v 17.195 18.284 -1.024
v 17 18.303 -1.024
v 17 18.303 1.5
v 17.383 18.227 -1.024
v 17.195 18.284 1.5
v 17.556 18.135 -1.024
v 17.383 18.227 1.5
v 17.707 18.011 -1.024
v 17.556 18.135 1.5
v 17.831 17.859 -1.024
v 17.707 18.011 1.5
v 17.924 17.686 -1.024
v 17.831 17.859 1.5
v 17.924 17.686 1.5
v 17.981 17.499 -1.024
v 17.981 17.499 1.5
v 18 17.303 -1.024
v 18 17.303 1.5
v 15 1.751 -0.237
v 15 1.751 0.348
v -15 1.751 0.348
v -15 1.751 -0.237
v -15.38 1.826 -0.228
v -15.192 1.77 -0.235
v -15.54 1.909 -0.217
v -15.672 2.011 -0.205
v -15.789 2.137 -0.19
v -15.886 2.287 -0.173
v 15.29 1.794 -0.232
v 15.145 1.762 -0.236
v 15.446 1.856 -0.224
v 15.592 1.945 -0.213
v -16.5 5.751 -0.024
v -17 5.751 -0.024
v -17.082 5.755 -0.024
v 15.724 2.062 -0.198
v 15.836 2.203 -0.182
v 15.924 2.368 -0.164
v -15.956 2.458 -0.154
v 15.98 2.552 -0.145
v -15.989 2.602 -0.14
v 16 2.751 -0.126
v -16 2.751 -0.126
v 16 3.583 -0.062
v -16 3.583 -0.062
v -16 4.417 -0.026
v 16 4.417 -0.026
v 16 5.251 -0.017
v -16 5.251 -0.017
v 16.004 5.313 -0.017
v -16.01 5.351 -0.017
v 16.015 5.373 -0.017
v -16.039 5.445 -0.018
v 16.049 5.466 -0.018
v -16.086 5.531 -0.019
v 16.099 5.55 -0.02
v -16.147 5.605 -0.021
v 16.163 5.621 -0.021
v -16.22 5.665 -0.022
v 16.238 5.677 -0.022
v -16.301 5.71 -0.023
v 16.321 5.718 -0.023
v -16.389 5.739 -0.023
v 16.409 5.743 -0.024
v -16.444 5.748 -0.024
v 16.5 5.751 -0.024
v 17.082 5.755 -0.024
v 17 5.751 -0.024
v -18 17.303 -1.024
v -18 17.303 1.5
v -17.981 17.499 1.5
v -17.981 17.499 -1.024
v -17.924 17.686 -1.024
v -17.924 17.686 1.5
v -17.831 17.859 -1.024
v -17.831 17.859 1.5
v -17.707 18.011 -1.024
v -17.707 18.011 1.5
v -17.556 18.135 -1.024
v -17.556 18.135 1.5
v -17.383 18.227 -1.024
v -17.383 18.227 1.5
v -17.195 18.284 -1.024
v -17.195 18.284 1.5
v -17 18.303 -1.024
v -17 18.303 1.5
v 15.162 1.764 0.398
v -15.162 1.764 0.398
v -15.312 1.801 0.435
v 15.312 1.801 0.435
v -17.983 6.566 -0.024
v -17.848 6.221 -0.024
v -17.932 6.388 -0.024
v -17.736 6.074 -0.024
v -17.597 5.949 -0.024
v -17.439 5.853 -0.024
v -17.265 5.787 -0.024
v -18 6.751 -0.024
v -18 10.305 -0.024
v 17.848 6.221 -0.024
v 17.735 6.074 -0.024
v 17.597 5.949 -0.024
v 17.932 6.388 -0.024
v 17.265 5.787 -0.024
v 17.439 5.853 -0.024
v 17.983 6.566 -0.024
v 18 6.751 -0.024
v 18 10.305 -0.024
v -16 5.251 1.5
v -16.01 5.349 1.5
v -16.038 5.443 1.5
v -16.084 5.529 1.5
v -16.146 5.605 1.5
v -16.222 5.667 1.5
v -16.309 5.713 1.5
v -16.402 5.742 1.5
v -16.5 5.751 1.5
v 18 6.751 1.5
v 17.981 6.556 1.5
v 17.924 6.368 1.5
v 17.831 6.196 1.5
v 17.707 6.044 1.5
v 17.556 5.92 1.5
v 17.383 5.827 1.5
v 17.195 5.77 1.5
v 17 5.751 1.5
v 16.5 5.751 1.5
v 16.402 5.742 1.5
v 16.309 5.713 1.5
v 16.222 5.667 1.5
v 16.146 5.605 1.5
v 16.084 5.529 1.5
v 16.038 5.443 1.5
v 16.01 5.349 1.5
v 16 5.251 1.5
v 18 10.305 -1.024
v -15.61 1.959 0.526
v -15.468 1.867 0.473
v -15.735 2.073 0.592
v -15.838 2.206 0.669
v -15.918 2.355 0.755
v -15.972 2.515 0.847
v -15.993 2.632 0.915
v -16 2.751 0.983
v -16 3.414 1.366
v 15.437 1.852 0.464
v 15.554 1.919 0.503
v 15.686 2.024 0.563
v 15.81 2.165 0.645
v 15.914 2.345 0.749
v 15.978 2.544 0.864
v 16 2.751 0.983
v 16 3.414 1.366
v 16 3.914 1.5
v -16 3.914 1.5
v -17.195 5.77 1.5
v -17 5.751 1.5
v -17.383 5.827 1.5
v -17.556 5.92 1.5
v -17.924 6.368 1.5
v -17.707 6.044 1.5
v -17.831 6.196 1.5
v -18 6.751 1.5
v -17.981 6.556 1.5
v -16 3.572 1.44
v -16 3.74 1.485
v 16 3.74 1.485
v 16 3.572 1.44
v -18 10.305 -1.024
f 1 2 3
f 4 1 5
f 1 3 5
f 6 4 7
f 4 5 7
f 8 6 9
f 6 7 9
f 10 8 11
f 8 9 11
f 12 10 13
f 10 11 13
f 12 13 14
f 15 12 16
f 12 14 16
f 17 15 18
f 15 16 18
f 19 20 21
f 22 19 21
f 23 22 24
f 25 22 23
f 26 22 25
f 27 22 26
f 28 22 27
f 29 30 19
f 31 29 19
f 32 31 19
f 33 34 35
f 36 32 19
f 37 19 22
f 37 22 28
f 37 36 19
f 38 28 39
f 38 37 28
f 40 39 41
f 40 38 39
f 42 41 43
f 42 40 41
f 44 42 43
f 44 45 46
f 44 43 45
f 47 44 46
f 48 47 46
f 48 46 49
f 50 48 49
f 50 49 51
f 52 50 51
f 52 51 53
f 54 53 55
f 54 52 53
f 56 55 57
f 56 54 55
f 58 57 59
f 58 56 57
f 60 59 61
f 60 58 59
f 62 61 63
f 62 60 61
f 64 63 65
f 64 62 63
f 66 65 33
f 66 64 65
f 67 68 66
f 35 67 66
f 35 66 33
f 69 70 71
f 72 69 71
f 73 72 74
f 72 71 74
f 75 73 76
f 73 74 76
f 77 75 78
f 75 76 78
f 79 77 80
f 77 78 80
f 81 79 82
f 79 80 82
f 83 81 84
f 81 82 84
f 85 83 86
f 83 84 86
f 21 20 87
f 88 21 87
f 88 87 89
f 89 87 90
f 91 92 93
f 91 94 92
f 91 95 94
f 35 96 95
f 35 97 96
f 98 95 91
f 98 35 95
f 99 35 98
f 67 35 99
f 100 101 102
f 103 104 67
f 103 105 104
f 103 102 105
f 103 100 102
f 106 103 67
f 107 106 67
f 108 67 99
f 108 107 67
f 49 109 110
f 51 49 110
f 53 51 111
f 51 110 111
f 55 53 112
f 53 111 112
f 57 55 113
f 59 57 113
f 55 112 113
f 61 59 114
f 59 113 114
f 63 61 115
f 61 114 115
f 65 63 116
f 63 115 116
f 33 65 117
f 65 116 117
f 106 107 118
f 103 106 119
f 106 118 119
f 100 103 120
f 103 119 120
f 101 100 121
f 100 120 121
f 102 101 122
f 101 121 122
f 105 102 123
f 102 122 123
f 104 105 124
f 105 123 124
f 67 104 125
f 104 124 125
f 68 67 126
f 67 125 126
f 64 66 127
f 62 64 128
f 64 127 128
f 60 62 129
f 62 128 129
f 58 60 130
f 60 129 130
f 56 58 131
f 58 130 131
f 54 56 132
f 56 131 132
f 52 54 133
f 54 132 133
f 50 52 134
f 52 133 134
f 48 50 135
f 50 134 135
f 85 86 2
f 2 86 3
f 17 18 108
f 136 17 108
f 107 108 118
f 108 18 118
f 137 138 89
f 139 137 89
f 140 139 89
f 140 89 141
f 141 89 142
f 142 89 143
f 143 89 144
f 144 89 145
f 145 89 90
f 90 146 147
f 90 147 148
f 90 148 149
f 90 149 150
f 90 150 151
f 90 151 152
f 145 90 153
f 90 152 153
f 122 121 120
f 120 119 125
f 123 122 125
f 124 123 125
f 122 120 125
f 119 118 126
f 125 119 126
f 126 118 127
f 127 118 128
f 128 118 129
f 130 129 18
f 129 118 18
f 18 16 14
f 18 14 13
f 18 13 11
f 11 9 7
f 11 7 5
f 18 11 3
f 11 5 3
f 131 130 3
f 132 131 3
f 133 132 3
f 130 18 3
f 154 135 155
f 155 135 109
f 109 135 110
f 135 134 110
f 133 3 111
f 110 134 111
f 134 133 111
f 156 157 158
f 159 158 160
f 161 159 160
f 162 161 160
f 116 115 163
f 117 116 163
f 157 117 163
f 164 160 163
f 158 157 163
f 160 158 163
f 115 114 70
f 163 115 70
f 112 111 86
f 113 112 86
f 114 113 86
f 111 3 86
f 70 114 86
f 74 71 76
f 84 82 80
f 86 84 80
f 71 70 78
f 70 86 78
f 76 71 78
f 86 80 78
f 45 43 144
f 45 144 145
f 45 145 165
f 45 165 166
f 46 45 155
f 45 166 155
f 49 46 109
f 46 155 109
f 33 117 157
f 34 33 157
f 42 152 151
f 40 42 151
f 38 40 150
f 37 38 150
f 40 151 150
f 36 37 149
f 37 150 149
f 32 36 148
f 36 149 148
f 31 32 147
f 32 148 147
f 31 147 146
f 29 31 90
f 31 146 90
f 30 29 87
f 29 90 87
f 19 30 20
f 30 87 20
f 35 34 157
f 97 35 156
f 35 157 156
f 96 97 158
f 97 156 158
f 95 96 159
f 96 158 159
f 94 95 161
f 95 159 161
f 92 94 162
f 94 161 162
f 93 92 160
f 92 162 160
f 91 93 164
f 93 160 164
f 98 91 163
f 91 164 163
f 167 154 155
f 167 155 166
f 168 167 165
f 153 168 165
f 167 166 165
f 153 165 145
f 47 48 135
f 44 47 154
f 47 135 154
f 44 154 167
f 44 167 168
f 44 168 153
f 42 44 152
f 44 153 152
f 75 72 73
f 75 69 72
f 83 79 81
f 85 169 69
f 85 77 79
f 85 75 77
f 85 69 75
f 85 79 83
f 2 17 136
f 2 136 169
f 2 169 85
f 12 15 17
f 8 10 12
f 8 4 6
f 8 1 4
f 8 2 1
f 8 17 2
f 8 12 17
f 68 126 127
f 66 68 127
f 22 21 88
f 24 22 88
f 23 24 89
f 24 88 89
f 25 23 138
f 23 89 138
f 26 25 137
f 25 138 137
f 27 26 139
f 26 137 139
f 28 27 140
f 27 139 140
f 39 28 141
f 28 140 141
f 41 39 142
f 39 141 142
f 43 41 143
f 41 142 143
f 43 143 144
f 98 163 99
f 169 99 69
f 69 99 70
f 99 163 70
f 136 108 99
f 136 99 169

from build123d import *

# Parameters (mm, degrees)
BOSS_EXTRUDE1_DEPTH      = 1.5
BOSS_EXTRUDE1_DEPTH_BACK = 1.2
CUT_EXTRUDE1_DEPTH       = 40
FILLET1_R                = 1


with BuildPart() as part:
    # Sketch1 → Boss-Extrude1 (new body, two sides)
    with BuildSketch(Plane.XY) as boss_extrude1_sk:
        with BuildLine():
            Line((-17.999999991, 9.304537824), (-17.999999991, 10.304506021))
            Line((-17.999999991, 10.304506021), (-17.999999991, 17.303464443))
            ThreePointArc((-17.999999991, 17.303464443), (-17.707106772, 18.010571225), (-16.999999991, 18.303464443))
            Line((-16.999999991, 18.303464443), (16.999968161, 18.303464443))
            ThreePointArc((16.999968161, 18.303464443), (17.707074942, 18.010571225), (17.999968161, 17.303464443))
            Line((17.999968161, 17.303464443), (17.999968161, 9.303464443))
            Line((17.999968161, 9.303464443), (17.999968161, 6.751174458))
            ThreePointArc((17.999968161, 6.751174458), (17.707074942, 6.044067677), (16.999968161, 5.751174458))
            Line((16.999968161, 5.751174458), (16.499999991, 5.751174458))
            ThreePointArc((16.499999991, 5.751174458), (16.1464466, 5.604727849), (15.999999991, 5.251174458))
            Line((15.999999991, 5.251174458), (15.999999991, 2.751174458))
            ThreePointArc((15.999999991, 2.751174458), (15.707106772, 2.044067677), (14.999999991, 1.751174458))
            Line((14.999999991, 1.751174458), (-14.999999991, 1.751174458))
            ThreePointArc((-14.999999991, 1.751174458), (-15.707106772, 2.044067677), (-15.999999991, 2.751174458))
            Line((-15.999999991, 2.751174458), (-15.999999991, 5.251174458))
            ThreePointArc((-15.999999991, 5.251174458), (-16.1464466, 5.604727849), (-16.499999991, 5.751174458))
            Line((-16.499999991, 5.751174458), (-16.999999991, 5.751174458))
            ThreePointArc((-16.999999991, 5.751174458), (-17.707106772, 6.044067677), (-17.999999991, 6.751174458))
            Line((-17.999999991, 6.751174458), (-17.999999991, 9.304537824))
        make_face()
    extrude(amount=BOSS_EXTRUDE1_DEPTH)
    extrude(boss_extrude1_sk.sketch, amount=-BOSS_EXTRUDE1_DEPTH_BACK)

    # Sketch3 → Cut-Extrude1 (cut)
    with BuildSketch(Plane(origin=(17.999968161, 0, 0), x_dir=(0, 0, -1), z_dir=(1, 0, 0))):
        with BuildLine():
            Line((0.023796664, 5.754537824), (0.023796664, 10.304537824))
            Line((0.023796664, 10.304537824), (1.023796664, 10.304537824))
            Line((1.023796664, 10.304537824), (1.023796664, 22.680762846))
            ThreePointArc((1.023796664, 22.680762846), (7.212872074, 16.614024598), (1.2708887, 10.304537824))
            Line((1.2708887, 10.304537824), (1.2708887, 1.751174458))
            Line((1.2708887, 1.751174458), (0.23729316, 1.751174458))
            ThreePointArc((0.23729316, 1.751174458), (0.053060483, 3.748723952), (0.023796664, 5.754537824))
        make_face()
        with BuildLine():
            Line((-1.5, 3.645881873), (-1.5, 1.751174458))
            Line((-1.5, 1.751174458), (-0.306090164, 1.751174458))
            Line((-0.306090164, 1.751174458), (-0.348355137, 1.751174458))
            ThreePointArc((-0.348355137, 1.751174458), (-0.398355137, 1.764571918), (-0.434957677, 1.801174458))
            Line((-0.434957677, 1.801174458), (-1.5, 3.645881873))
        make_face()
    extrude(amount=-CUT_EXTRUDE1_DEPTH, mode=Mode.SUBTRACT)

    # Fillet1
    fillet1_edges = [part.edges().sort_by_distance(p)[0] for p in [
        (0, 3.645881873, 1.5),
    ]]
    fillet(fillet1_edges, radius=FILLET1_R)


solid = part.part
